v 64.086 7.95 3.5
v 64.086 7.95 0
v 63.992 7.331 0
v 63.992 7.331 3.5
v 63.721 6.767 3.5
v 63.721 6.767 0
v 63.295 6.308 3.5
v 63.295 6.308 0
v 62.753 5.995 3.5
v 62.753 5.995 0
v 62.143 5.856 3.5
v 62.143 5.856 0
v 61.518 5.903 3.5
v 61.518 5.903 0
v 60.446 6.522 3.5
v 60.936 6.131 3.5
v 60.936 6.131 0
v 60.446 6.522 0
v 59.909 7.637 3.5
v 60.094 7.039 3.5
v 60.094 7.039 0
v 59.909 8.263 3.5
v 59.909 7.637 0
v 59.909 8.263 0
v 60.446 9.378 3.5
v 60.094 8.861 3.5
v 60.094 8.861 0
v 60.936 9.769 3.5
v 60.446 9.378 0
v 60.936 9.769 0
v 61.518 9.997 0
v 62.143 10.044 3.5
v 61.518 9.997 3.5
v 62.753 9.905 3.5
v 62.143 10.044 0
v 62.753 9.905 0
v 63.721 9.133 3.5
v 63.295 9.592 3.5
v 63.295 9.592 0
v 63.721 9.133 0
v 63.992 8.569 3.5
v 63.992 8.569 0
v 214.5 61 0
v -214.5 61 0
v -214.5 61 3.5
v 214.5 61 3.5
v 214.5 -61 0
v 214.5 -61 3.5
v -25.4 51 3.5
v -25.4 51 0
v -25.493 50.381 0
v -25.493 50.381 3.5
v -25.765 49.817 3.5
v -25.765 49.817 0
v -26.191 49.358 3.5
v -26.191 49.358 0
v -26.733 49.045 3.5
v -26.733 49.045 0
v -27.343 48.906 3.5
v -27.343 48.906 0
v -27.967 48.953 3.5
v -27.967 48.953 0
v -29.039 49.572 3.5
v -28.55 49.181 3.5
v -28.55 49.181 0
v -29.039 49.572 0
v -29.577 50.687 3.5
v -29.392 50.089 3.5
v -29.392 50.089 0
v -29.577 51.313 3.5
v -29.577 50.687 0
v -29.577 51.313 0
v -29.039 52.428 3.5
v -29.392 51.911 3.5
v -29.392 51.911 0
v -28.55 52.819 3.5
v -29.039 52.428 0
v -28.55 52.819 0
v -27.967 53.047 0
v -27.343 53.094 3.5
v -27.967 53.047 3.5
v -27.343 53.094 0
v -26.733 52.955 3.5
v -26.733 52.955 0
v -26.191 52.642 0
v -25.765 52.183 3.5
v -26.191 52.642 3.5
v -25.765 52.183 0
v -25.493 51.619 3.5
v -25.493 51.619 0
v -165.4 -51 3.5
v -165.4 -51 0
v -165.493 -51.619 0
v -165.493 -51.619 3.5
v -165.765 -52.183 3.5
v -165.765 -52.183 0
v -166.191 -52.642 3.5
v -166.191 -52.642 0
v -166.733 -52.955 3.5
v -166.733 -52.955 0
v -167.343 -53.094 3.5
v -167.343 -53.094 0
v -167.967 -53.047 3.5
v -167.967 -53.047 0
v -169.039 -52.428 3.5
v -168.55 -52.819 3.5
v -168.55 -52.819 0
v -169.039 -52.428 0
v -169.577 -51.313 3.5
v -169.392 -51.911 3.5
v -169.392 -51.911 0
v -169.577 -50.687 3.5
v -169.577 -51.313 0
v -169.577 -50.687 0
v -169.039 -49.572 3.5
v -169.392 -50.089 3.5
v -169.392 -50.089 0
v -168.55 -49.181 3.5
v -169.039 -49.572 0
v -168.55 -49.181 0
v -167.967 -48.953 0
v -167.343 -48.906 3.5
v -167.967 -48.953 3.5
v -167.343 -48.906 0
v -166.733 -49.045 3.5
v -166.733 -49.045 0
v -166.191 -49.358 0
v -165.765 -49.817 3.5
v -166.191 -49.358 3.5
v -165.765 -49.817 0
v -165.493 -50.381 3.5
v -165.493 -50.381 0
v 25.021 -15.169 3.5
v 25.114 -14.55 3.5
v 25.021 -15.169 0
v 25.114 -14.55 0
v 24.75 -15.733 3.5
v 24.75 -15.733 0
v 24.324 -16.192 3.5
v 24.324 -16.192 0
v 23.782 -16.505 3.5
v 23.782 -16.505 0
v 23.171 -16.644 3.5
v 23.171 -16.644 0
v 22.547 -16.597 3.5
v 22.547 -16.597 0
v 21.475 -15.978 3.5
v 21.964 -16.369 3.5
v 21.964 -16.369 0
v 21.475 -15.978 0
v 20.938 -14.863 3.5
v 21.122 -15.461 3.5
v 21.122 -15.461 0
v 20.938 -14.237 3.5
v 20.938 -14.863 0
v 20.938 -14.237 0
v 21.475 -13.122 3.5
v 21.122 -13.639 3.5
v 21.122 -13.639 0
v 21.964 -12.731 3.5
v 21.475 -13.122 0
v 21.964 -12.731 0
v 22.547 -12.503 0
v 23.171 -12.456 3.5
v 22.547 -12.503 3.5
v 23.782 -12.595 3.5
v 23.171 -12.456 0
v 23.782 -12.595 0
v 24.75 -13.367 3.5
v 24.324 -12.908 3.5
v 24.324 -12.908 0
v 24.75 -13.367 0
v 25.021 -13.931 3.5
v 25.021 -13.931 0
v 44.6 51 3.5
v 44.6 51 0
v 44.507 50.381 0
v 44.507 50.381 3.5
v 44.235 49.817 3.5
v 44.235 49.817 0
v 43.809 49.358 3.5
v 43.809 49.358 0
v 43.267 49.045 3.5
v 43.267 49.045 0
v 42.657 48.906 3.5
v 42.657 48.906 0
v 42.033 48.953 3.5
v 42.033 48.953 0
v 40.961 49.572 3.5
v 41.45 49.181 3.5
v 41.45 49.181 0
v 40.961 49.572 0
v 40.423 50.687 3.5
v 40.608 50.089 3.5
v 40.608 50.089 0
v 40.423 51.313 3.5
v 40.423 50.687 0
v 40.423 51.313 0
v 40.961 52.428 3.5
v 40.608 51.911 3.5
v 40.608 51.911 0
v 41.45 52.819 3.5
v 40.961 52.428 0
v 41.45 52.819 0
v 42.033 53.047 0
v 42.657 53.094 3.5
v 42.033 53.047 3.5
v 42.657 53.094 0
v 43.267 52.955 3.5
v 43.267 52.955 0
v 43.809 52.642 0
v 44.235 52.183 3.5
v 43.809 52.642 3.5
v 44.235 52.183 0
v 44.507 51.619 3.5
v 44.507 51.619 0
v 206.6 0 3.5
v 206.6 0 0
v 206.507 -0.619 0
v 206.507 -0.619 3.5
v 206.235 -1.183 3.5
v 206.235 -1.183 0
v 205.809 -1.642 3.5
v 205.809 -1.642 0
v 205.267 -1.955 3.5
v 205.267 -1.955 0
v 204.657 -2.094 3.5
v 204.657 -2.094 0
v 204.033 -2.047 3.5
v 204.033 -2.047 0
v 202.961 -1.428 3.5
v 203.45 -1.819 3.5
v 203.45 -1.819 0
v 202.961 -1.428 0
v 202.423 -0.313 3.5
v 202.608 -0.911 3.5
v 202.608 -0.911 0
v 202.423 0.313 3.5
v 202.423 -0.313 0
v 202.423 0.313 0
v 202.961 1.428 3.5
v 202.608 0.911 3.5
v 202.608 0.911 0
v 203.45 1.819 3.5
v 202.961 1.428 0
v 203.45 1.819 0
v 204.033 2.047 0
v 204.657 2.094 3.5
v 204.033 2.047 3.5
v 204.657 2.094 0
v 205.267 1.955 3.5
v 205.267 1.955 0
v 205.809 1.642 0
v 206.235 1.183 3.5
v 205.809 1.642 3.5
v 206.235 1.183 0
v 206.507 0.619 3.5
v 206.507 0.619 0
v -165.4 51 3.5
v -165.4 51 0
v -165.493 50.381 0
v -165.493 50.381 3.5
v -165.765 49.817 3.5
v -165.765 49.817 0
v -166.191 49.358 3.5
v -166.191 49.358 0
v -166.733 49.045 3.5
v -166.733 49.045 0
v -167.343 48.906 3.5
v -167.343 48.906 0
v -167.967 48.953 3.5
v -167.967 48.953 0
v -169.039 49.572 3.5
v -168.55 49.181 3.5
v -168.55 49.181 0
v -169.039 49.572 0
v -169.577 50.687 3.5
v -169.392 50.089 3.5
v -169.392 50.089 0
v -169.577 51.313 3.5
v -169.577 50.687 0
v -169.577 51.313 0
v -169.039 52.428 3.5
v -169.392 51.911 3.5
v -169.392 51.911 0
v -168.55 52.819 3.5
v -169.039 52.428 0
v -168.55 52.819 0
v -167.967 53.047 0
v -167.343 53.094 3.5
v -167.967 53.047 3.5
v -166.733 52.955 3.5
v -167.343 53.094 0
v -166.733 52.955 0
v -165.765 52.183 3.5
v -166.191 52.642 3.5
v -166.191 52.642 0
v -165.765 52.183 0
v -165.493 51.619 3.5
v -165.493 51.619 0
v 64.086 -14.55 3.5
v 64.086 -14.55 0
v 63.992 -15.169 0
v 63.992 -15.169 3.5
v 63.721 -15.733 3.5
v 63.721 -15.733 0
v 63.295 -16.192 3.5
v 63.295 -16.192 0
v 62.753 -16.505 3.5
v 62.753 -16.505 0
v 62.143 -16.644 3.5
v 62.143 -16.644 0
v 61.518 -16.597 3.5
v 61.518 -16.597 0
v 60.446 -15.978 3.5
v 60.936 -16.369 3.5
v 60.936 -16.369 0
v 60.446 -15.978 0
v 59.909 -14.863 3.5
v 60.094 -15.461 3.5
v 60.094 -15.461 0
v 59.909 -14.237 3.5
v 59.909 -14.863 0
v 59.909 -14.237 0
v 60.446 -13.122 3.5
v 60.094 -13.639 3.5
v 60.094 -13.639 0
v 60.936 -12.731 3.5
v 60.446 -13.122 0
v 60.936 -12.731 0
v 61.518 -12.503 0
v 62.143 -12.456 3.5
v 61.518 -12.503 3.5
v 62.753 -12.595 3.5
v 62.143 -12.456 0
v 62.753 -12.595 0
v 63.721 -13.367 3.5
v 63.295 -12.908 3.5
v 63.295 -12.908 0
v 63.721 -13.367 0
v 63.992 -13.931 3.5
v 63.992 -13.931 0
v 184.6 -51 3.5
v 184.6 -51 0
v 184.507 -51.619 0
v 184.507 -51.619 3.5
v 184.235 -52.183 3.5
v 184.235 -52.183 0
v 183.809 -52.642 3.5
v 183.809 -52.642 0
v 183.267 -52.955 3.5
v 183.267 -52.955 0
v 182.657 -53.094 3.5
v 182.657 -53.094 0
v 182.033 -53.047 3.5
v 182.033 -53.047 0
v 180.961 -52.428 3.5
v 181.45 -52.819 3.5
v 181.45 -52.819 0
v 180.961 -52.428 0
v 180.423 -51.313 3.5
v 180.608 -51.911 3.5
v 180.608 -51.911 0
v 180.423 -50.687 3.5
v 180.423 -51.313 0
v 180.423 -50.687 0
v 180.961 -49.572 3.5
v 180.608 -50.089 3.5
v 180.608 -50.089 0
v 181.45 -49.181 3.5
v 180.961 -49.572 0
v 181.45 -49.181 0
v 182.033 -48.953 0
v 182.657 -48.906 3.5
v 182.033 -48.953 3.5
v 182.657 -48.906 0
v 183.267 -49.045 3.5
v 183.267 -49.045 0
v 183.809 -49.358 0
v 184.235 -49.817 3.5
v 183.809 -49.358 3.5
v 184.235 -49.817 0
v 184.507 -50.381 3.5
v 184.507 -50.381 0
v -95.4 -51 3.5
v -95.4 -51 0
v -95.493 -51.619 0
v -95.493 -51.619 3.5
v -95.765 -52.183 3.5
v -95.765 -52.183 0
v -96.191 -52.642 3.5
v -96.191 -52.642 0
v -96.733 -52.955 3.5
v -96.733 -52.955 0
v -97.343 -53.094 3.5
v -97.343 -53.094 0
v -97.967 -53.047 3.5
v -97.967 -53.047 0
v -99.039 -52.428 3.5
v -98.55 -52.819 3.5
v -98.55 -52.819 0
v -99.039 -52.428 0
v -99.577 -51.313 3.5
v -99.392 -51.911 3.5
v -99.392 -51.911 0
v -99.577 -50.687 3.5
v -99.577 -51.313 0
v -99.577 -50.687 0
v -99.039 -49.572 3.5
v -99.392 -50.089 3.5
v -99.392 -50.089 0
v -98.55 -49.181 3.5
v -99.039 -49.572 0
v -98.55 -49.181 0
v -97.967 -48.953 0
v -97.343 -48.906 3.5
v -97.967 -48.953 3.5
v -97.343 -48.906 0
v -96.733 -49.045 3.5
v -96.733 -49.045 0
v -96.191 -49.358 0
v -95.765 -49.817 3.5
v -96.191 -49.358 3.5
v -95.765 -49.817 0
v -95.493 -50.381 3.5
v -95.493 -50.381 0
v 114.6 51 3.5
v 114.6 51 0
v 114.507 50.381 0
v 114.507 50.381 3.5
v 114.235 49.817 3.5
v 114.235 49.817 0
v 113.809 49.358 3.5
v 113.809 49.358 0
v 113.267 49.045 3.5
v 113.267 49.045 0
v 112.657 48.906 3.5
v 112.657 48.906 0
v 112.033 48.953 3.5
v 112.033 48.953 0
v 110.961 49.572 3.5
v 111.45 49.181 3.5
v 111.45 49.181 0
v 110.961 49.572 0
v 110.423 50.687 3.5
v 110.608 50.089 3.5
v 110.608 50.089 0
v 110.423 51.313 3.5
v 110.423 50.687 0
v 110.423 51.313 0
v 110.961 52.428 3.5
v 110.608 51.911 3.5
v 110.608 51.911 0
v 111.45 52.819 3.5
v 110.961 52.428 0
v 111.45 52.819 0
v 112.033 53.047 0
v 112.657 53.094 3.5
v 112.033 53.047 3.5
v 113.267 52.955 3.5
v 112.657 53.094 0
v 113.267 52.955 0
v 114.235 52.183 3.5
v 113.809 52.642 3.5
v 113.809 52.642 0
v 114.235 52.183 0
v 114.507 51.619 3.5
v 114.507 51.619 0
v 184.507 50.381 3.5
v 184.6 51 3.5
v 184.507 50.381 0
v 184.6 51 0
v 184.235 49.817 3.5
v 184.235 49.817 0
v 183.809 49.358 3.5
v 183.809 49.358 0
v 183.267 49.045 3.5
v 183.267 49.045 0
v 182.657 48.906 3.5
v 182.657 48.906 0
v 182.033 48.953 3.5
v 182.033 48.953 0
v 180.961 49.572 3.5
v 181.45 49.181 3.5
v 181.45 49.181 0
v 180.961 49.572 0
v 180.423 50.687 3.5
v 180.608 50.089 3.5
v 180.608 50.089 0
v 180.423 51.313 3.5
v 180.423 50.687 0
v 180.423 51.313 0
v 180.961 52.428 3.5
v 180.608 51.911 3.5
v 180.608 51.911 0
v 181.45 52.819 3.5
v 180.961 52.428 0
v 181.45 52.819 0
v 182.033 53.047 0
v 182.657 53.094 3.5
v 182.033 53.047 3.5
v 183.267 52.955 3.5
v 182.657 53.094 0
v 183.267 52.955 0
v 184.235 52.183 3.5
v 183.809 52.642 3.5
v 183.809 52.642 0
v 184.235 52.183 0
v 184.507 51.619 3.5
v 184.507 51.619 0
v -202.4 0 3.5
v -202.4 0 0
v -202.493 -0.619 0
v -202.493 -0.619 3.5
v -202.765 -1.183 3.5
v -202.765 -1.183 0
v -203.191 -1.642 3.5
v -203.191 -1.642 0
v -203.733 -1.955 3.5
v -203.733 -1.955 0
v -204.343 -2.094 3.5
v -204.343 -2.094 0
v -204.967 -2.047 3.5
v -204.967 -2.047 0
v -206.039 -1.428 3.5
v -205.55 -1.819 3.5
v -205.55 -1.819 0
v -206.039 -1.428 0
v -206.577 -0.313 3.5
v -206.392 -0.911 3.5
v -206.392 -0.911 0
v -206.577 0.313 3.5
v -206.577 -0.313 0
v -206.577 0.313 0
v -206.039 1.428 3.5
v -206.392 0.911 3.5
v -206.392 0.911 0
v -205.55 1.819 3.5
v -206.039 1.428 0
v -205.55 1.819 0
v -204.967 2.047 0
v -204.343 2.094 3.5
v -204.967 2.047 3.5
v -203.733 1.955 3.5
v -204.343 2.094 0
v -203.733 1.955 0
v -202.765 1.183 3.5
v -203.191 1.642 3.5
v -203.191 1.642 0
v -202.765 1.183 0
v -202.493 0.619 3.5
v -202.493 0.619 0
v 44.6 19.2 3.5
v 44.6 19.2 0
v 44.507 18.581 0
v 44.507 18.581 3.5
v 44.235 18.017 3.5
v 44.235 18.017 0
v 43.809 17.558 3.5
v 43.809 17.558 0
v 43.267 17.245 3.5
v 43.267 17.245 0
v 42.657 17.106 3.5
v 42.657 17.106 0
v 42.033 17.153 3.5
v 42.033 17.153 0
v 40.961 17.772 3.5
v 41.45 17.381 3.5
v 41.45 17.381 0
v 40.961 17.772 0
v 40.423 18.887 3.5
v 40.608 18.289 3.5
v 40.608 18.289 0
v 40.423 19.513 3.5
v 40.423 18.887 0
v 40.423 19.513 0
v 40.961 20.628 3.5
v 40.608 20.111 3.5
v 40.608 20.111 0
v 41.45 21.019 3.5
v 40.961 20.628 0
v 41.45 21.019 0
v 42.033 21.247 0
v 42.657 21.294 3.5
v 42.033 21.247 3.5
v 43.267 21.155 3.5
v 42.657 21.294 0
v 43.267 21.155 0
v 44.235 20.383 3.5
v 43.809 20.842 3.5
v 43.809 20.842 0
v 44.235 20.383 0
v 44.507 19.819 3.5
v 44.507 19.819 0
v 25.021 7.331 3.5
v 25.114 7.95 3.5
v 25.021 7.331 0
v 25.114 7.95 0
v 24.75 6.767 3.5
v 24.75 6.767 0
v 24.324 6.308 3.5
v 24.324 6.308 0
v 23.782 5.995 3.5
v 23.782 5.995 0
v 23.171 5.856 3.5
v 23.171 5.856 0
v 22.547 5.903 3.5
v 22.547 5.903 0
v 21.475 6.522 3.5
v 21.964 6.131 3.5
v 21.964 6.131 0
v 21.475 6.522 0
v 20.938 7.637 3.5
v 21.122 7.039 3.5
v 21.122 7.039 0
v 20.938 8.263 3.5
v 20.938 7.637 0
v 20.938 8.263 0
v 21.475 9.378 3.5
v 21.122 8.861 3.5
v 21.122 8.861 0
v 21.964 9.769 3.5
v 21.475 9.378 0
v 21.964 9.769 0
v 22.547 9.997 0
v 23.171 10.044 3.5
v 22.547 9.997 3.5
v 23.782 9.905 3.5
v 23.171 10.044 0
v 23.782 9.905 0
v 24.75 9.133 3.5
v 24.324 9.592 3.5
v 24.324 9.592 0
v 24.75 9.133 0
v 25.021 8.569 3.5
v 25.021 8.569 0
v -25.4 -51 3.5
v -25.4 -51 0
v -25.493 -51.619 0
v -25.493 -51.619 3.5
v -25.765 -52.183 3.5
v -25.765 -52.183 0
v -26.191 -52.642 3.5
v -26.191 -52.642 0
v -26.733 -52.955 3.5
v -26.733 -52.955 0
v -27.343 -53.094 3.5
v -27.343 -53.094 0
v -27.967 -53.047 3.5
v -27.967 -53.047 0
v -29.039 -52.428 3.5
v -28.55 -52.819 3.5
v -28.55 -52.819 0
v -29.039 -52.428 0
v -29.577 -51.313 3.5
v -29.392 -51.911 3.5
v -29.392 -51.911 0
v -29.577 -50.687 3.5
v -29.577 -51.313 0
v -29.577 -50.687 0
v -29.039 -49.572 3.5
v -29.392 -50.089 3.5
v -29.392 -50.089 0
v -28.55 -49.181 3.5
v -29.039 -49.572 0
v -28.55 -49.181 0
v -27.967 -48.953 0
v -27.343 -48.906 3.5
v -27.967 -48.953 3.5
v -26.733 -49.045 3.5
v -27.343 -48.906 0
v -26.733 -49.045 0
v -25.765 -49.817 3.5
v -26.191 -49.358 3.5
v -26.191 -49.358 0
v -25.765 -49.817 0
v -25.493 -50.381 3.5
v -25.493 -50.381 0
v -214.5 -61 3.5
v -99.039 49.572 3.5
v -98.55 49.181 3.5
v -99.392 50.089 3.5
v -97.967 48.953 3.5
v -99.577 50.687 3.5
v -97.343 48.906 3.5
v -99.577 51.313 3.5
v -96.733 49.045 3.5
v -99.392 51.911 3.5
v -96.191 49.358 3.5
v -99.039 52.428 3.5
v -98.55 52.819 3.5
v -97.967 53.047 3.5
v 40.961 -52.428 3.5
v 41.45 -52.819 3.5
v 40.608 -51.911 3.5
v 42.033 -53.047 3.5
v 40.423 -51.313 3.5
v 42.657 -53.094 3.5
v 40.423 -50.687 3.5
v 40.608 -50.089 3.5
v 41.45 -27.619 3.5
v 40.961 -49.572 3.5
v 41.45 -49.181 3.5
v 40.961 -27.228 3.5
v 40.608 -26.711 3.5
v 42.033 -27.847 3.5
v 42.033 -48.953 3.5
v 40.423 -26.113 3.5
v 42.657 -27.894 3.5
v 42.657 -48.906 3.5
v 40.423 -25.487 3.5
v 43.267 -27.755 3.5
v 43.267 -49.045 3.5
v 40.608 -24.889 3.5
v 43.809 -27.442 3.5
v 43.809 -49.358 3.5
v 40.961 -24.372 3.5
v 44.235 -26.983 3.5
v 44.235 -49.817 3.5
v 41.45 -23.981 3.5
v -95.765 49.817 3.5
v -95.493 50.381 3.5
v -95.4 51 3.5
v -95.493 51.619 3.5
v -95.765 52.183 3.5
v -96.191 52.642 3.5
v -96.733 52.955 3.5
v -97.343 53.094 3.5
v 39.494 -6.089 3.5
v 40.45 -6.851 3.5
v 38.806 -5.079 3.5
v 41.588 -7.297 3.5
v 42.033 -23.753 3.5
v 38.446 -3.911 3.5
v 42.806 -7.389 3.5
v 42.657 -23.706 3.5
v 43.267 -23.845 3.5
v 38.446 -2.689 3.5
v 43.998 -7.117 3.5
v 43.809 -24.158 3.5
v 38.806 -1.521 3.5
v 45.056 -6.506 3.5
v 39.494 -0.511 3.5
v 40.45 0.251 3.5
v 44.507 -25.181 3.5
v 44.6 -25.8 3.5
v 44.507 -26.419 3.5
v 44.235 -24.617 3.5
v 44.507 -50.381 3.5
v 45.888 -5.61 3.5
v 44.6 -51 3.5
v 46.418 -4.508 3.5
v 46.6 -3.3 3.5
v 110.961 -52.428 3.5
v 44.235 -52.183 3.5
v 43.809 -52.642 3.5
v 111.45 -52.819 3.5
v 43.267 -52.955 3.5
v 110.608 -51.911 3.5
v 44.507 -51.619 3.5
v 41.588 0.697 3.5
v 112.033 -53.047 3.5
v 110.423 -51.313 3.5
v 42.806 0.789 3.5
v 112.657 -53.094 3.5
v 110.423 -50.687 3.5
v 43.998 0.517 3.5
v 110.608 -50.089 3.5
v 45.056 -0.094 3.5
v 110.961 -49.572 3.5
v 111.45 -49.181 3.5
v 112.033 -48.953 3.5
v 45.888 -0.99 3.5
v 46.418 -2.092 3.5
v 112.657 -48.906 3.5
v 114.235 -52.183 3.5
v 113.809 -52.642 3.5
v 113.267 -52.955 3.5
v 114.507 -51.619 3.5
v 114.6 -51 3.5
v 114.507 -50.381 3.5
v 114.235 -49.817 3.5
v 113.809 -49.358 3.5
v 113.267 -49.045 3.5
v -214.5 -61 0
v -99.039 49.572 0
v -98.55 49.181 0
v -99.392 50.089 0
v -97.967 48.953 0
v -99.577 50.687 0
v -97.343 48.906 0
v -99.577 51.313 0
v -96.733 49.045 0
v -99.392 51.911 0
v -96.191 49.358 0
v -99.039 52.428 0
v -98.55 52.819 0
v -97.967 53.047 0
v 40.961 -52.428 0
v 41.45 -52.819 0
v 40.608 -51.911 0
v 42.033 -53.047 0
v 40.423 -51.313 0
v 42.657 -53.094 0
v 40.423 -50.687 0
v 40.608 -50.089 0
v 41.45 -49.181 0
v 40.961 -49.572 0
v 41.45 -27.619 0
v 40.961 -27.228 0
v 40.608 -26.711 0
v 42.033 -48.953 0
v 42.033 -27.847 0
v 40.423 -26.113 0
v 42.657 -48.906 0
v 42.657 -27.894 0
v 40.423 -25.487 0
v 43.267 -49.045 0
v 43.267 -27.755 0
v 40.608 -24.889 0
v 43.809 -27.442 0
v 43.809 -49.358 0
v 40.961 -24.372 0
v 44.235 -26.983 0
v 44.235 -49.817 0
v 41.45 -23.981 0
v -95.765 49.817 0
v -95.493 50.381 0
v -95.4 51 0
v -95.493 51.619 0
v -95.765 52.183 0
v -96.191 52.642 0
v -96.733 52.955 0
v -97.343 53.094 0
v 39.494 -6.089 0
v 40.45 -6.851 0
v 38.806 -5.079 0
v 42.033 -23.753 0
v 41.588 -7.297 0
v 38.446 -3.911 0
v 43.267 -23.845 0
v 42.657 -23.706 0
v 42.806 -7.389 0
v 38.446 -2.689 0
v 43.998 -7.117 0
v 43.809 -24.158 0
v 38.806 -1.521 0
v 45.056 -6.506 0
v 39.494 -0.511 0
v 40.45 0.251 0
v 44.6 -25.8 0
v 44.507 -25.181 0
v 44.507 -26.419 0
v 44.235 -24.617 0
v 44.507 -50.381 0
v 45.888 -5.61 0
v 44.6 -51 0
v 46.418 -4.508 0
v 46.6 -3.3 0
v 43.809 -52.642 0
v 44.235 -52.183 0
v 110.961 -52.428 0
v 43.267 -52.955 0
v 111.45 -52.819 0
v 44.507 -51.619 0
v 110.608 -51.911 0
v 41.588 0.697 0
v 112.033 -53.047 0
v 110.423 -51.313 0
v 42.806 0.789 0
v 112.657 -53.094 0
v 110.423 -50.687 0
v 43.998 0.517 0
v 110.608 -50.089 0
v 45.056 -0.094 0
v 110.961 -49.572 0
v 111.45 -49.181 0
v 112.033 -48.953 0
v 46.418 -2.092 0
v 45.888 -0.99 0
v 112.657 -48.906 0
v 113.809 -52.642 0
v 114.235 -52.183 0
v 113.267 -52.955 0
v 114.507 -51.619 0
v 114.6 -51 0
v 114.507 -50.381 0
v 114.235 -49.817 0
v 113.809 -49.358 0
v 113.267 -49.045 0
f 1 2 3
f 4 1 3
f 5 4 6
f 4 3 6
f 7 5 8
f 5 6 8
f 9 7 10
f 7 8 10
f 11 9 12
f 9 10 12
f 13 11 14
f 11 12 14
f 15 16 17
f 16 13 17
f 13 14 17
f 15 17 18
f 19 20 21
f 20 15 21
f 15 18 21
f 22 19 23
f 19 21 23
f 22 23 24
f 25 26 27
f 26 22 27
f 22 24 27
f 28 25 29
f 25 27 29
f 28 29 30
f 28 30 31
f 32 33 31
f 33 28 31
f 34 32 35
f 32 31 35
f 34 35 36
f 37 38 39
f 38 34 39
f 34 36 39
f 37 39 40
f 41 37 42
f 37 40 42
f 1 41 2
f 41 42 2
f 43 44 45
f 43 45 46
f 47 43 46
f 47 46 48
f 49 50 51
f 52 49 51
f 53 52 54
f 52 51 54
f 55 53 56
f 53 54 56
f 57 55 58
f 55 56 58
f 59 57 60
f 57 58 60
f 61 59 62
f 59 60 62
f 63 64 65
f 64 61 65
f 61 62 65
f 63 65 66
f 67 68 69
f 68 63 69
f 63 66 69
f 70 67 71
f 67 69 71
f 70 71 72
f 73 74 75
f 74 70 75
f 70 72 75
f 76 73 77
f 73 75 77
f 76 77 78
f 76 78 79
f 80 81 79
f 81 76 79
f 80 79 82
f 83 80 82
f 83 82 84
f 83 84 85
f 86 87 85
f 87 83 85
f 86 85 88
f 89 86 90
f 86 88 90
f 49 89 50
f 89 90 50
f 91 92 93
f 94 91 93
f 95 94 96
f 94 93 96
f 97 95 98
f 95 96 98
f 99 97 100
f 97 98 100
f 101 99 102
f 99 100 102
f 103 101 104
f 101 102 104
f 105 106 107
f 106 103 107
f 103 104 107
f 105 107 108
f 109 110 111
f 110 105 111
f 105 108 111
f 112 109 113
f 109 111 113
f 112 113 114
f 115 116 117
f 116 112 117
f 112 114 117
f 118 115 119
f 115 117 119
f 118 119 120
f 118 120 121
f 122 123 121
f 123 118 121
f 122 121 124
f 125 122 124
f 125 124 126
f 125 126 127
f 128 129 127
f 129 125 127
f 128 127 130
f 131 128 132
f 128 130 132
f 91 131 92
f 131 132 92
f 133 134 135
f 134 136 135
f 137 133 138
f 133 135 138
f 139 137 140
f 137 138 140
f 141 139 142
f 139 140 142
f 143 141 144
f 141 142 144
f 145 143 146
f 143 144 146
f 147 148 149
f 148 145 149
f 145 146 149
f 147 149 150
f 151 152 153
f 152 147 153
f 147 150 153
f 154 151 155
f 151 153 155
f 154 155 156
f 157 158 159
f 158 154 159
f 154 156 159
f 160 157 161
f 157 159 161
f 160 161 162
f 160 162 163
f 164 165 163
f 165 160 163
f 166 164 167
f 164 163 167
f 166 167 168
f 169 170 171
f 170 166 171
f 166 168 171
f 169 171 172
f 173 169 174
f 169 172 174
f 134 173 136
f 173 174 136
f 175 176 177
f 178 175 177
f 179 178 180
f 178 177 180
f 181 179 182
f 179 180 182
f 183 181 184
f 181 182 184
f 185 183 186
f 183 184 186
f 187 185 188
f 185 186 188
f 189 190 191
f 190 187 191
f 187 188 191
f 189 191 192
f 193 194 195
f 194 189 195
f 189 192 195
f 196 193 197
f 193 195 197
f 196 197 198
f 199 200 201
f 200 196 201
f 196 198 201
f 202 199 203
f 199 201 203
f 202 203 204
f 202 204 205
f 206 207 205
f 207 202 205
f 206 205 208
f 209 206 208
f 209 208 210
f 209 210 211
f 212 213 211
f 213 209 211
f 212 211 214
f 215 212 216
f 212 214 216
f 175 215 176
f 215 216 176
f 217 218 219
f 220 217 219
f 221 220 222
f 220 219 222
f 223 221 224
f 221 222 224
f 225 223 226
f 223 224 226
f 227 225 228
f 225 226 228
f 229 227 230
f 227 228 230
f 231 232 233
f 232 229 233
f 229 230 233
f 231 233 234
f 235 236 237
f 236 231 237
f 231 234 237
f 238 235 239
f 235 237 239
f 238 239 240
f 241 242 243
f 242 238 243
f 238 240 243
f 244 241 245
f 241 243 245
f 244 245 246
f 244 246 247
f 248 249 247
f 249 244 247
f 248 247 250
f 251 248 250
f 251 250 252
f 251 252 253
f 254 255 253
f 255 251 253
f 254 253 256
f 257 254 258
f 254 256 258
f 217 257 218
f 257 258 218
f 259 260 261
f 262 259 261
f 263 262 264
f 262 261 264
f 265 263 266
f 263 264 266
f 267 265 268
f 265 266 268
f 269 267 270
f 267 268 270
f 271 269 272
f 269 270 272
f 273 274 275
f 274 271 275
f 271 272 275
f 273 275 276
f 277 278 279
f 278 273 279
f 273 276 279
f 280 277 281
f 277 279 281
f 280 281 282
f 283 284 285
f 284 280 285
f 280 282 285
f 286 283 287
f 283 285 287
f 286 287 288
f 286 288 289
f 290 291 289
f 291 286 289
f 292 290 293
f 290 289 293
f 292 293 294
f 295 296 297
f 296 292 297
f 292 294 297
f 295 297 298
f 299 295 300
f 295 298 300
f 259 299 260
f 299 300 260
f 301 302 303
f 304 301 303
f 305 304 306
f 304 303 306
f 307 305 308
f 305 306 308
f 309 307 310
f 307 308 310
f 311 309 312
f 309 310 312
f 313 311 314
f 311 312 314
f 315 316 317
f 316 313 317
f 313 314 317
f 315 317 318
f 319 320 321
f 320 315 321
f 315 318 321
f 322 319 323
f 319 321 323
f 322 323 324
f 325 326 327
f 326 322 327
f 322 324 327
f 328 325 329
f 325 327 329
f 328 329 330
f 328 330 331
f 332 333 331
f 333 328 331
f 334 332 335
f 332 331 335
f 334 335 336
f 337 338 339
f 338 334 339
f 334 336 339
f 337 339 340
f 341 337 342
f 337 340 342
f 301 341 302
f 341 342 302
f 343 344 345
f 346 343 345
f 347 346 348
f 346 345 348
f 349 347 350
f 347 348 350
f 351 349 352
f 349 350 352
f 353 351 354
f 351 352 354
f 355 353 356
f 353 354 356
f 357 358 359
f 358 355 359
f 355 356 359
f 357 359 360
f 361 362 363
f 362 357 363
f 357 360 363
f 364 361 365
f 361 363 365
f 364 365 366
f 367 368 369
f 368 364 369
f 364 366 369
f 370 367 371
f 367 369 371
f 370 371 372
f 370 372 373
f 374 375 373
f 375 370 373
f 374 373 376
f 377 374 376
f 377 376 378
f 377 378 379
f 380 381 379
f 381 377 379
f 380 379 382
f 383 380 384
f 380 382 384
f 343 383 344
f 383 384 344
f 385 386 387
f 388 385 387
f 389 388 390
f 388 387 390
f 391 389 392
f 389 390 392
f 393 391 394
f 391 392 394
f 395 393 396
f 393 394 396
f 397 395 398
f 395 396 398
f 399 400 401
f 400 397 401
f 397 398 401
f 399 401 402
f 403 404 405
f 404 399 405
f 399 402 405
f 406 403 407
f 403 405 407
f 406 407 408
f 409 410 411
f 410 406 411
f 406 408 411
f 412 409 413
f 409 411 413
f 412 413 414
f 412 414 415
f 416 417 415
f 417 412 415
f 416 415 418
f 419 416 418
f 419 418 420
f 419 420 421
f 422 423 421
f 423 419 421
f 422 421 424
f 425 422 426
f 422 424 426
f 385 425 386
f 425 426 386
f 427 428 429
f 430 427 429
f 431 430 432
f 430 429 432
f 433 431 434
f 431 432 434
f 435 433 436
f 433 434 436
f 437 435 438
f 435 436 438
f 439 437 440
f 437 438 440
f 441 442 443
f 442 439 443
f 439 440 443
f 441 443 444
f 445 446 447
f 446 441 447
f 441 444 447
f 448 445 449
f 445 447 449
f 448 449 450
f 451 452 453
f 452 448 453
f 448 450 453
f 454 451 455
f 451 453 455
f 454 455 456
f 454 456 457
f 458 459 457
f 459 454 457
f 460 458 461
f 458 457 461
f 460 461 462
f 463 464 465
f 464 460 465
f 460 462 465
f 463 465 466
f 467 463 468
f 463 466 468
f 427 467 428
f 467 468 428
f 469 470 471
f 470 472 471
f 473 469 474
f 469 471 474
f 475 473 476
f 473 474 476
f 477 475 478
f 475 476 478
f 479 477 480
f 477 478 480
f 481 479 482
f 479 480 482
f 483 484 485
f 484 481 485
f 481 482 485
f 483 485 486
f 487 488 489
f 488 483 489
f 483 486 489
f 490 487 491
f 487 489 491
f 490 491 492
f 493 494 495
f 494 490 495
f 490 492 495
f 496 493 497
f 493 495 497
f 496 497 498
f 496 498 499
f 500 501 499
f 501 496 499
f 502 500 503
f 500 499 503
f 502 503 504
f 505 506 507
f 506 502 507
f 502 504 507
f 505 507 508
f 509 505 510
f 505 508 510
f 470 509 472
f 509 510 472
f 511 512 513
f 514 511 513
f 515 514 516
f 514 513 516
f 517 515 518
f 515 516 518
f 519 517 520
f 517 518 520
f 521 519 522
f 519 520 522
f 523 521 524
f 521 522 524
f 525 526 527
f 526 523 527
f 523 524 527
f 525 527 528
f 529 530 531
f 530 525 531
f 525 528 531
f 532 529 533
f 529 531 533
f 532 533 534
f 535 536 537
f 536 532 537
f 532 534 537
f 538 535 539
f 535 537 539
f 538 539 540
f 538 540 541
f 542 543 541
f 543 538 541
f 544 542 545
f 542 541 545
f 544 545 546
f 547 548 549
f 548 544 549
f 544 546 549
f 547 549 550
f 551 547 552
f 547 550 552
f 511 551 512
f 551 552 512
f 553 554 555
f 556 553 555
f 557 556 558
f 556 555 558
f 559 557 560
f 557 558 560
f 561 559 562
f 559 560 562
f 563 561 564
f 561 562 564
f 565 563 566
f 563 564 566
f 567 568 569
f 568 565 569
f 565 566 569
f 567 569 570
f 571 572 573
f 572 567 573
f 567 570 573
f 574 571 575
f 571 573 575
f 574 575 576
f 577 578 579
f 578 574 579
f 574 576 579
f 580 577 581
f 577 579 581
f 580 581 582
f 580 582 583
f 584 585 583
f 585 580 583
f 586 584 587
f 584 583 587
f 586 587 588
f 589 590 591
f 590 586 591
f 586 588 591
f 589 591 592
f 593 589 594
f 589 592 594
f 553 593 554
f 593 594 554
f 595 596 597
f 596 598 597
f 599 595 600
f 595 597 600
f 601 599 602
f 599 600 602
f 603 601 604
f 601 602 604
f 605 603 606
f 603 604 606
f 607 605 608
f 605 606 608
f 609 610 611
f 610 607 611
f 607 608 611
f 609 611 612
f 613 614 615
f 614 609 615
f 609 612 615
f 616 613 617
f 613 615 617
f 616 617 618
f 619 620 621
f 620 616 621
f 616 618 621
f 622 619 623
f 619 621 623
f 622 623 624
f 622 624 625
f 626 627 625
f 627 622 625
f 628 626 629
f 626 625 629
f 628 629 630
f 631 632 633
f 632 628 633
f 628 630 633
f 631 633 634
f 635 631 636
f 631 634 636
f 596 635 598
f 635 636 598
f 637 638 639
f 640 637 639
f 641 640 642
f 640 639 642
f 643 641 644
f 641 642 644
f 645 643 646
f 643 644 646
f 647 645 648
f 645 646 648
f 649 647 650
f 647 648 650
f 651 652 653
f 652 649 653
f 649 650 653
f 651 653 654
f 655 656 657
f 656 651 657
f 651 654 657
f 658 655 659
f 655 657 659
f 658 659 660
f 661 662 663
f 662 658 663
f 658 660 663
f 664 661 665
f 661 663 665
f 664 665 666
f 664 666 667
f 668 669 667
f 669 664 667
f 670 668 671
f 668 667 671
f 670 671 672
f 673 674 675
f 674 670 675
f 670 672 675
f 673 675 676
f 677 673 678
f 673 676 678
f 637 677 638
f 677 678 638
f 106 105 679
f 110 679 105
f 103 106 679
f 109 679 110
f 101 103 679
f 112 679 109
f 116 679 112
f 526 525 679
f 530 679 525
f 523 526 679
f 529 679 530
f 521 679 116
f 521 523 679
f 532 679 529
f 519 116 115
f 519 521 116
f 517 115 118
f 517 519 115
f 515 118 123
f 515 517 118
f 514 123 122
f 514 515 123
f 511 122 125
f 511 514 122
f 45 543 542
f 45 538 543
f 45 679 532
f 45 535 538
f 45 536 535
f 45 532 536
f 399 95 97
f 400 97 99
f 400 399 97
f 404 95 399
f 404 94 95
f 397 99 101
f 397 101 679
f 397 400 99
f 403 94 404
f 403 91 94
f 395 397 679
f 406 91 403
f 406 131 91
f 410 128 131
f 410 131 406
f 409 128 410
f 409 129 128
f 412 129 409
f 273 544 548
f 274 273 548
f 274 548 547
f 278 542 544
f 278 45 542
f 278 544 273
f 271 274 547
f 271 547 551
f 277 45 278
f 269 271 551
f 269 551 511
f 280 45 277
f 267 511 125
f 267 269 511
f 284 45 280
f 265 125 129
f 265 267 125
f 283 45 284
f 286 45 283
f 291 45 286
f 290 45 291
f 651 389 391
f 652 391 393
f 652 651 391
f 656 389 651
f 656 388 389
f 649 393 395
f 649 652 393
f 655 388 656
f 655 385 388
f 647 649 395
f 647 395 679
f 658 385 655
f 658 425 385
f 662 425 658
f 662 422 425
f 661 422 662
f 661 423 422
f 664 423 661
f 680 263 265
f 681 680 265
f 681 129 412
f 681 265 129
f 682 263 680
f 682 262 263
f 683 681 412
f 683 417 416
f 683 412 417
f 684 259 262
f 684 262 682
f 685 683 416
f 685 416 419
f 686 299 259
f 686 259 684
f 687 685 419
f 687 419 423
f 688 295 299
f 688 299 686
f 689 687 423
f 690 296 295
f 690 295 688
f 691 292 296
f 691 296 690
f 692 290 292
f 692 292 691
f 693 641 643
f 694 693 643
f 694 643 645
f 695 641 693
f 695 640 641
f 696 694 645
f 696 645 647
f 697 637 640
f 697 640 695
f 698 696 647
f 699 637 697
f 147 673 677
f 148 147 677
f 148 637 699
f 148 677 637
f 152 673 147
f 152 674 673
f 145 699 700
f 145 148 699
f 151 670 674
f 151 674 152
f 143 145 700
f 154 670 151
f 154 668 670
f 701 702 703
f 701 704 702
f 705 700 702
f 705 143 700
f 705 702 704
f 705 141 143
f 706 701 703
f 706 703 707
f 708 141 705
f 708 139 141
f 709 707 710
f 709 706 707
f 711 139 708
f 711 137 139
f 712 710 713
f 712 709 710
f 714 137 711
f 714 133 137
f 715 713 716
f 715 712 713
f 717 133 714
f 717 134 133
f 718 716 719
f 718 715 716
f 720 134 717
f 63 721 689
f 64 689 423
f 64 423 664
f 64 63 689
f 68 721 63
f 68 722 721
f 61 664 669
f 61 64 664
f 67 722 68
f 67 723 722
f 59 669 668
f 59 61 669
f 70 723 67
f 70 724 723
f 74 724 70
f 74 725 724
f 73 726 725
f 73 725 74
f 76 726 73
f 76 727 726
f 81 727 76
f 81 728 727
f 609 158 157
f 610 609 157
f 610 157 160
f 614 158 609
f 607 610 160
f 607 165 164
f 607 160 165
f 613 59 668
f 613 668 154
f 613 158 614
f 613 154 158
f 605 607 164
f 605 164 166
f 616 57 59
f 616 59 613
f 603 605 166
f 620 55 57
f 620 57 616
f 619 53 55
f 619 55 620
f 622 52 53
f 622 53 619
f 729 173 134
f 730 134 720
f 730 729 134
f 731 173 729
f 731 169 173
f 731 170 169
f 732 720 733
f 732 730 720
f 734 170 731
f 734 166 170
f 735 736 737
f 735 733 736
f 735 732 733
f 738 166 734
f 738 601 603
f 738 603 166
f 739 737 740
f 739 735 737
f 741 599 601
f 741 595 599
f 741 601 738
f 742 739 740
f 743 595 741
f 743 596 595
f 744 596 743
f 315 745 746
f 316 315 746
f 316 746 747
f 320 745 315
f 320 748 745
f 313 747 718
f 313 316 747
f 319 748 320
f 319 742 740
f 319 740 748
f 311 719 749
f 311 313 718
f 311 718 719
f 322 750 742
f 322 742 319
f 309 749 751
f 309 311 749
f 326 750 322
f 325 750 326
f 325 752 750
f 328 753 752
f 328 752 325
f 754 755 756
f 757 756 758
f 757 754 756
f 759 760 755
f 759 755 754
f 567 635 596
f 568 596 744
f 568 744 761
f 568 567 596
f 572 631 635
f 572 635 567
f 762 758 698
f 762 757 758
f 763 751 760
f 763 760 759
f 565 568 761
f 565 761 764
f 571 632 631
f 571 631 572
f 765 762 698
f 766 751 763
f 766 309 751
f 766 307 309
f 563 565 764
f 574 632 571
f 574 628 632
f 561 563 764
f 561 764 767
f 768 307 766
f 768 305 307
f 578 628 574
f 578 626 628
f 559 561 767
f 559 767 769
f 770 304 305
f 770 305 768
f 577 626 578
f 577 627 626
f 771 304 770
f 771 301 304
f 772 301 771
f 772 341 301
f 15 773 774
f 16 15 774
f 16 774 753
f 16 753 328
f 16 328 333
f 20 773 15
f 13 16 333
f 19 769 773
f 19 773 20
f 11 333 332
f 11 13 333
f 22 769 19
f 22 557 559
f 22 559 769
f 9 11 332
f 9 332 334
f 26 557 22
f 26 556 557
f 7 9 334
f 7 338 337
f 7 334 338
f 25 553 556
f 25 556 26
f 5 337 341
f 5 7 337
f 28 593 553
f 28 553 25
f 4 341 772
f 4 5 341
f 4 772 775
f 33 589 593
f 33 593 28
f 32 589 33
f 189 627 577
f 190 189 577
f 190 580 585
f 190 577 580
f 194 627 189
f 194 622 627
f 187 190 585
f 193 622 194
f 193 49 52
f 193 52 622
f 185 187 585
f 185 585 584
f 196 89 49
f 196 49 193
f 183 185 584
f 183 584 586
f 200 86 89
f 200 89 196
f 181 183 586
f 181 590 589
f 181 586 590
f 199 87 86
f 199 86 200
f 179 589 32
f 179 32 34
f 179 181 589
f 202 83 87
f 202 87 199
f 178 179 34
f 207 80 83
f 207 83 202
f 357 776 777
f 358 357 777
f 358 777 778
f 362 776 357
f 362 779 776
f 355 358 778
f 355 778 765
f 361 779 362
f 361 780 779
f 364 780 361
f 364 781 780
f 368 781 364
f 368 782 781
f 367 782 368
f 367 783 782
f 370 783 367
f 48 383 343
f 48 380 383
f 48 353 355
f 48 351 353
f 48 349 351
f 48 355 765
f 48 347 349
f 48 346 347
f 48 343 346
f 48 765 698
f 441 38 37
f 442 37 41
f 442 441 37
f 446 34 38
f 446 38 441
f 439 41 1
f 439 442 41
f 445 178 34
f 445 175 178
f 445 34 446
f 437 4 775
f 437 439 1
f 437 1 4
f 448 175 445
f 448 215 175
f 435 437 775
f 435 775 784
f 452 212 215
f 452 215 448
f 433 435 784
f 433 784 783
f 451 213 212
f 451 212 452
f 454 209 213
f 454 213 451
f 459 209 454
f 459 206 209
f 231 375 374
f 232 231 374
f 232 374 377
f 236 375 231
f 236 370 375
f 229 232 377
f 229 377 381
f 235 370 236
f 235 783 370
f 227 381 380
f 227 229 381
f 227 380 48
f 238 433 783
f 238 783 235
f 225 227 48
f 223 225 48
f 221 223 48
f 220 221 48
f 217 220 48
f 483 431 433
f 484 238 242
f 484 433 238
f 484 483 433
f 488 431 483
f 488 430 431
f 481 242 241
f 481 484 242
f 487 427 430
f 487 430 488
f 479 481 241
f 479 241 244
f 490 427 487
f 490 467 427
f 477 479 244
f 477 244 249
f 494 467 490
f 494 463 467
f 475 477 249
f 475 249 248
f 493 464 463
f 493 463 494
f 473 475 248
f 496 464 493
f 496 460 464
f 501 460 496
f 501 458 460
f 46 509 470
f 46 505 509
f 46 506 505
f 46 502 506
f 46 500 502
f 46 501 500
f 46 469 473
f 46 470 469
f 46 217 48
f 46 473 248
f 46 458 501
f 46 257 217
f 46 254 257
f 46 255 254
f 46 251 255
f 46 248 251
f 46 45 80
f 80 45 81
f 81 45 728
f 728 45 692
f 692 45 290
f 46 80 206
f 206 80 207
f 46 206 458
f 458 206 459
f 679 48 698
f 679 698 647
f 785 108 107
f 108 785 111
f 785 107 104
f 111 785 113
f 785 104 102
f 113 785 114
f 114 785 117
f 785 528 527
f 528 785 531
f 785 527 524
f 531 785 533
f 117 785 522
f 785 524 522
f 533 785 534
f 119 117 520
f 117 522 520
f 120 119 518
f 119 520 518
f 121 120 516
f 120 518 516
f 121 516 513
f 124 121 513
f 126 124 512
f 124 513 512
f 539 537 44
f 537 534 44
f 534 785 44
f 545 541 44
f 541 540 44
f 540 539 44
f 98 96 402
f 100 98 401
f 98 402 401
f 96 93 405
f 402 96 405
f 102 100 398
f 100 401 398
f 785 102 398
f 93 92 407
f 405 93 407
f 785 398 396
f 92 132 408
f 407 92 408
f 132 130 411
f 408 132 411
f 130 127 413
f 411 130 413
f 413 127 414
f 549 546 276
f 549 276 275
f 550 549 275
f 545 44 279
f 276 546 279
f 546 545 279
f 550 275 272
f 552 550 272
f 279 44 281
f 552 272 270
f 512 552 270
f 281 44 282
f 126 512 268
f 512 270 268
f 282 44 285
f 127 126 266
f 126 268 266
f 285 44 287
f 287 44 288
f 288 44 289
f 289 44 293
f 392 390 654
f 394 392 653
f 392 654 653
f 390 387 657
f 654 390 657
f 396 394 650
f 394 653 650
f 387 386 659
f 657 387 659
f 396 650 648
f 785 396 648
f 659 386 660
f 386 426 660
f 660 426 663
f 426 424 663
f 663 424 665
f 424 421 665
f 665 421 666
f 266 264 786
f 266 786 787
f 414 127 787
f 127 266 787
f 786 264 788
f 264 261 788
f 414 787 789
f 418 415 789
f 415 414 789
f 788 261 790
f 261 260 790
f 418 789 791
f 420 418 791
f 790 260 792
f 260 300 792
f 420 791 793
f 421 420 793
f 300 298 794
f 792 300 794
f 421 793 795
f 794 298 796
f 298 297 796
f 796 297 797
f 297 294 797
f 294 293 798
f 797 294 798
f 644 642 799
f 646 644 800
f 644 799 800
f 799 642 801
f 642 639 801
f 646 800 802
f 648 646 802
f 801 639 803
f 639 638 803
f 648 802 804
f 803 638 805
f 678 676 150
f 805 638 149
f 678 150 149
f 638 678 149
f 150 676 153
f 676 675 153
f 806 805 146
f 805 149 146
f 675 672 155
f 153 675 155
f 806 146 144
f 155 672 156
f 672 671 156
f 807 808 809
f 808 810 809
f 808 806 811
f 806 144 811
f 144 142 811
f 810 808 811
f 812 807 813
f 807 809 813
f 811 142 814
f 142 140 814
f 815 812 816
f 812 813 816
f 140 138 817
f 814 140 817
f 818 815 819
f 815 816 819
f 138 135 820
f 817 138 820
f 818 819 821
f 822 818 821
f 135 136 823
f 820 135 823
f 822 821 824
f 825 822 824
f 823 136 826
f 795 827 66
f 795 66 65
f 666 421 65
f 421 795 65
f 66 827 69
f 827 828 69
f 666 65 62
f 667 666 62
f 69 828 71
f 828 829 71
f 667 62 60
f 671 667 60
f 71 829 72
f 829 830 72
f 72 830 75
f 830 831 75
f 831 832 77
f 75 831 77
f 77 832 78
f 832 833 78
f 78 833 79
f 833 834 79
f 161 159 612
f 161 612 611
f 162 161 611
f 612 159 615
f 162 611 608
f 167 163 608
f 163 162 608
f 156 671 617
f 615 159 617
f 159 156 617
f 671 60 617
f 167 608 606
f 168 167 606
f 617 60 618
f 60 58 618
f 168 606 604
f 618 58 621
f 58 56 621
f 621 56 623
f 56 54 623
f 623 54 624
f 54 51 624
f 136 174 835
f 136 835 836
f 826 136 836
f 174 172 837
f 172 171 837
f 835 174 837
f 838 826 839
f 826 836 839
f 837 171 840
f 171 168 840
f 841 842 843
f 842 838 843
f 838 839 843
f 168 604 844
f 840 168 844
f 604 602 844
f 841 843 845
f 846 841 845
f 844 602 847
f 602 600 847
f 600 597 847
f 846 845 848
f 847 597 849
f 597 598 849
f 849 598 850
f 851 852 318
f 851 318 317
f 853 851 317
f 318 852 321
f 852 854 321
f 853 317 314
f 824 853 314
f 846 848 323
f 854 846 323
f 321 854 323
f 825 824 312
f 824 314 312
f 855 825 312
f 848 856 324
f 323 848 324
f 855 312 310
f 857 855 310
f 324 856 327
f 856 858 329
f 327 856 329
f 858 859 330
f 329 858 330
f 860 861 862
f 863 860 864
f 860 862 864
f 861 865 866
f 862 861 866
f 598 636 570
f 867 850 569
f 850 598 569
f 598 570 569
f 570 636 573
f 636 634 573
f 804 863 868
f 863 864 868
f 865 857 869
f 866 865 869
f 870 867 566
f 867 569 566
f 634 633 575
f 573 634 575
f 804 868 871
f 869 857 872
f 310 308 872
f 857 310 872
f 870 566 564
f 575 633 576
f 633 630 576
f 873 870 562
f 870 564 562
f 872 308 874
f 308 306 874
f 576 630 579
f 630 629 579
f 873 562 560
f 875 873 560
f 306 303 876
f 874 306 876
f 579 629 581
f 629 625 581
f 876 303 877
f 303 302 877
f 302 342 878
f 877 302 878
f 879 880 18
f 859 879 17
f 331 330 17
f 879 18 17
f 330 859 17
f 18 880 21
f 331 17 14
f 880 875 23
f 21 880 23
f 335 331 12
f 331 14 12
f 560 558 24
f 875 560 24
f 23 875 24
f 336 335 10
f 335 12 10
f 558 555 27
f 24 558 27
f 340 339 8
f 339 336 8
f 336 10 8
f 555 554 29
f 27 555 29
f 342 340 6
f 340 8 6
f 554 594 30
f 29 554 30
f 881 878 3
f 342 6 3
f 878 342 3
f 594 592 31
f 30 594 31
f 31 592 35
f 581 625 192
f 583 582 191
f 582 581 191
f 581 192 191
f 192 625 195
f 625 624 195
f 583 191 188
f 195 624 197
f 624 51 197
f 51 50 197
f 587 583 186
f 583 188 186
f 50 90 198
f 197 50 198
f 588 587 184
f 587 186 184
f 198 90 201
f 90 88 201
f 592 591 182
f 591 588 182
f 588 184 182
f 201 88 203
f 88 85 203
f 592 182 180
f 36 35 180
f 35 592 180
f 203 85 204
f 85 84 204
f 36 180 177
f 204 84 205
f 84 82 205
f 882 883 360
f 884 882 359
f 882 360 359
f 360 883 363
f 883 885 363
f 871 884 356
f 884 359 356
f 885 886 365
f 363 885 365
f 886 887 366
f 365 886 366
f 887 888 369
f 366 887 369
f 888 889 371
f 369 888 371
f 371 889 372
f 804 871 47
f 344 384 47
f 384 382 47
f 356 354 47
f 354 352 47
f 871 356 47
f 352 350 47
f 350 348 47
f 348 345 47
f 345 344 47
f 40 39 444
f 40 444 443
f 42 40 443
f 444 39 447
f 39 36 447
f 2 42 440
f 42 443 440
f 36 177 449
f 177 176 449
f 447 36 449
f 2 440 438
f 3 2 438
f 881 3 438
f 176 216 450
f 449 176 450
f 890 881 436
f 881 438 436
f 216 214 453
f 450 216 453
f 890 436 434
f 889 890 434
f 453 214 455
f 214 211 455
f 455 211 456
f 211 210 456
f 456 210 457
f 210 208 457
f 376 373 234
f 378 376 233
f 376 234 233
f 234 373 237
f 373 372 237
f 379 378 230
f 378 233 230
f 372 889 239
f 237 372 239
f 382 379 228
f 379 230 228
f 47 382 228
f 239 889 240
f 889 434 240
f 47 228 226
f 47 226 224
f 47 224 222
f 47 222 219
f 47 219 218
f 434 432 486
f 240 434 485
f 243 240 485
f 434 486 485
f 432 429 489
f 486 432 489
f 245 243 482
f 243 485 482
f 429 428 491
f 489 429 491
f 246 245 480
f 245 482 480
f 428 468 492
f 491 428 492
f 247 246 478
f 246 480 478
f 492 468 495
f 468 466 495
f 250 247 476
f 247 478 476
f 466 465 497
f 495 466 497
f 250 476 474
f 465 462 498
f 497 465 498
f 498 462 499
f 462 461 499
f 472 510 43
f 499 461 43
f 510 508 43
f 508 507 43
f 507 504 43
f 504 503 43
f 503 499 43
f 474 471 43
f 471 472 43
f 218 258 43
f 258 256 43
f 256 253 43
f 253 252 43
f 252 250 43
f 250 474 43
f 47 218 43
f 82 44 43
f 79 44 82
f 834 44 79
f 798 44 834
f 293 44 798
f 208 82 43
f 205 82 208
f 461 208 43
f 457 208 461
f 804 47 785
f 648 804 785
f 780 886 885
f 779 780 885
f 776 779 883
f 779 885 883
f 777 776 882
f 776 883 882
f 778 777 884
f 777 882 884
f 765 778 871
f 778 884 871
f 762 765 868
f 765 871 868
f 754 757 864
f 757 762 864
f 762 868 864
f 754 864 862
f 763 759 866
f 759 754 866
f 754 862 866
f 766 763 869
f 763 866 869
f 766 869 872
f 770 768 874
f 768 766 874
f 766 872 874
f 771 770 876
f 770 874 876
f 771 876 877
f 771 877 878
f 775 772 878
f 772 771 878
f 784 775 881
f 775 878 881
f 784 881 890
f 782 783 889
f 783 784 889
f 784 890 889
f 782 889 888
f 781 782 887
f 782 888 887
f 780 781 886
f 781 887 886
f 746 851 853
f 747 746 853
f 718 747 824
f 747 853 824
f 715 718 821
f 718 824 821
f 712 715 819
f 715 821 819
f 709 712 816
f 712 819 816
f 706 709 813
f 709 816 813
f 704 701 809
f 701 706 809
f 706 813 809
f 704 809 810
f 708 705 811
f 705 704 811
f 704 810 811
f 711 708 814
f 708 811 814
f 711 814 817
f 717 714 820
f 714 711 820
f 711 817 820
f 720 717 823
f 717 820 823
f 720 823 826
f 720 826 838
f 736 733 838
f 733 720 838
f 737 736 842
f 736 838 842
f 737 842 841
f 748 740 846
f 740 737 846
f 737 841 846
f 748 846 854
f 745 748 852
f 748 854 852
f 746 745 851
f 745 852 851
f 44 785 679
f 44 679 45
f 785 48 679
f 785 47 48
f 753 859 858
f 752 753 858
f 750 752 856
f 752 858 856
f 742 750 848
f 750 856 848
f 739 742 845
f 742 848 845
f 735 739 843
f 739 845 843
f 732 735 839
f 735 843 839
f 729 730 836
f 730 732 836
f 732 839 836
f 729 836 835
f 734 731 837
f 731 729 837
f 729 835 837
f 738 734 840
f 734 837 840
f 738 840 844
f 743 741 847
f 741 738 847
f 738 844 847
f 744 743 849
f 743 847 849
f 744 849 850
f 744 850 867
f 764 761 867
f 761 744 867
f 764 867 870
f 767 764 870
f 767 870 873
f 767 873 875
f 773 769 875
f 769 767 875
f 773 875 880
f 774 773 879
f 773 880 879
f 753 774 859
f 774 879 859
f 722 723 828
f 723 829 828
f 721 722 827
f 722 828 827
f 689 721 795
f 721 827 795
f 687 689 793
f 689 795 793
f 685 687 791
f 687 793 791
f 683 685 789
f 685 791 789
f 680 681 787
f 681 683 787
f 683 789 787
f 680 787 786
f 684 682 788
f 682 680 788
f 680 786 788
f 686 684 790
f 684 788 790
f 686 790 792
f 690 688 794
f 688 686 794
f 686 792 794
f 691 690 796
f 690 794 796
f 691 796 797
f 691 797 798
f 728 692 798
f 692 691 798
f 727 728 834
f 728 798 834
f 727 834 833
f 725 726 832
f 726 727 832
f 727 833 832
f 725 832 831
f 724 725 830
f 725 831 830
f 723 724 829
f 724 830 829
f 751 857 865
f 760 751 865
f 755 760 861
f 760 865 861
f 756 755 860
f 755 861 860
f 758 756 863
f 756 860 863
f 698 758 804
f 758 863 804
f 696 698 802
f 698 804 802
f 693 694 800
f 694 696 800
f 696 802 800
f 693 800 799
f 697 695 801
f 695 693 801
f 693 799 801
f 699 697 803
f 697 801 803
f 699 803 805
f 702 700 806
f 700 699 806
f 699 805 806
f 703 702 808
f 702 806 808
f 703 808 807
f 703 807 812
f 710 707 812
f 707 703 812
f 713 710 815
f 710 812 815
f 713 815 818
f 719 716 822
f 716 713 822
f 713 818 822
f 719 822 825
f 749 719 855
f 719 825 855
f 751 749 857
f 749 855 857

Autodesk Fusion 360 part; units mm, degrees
sketch "Sketch2" plane through (0, 0, 0) normal (0, 0, 1) x (1, 0, 0)
  line L0 (-214.5, -61) -> (-214.5, 61)
  line L1 (-214.5, -61) -> (214.5, 61) construction
  line L2 (-214.5, 61) -> (214.5, 61)
  circle A0 centre (42.5, -3.3) radius 4.1
  line L3 (214.5, -61) -> (-214.5, 61) construction
  line L4 (214.5, 61) -> (214.5, -61)
  line L5 (214.5, -61) -> (-214.5, -61)
  line L6 (-214.5, 0) -> (214.5, 0) construction
  line L7 (-214.5, -3.3) -> (214.5, -3.3) construction
  line L8 (42.5, 61) -> (42.5, -61) construction
  circle A1 centre (42.5, 51) radius 2.1
  line L9 (-214.5, 51) -> (214.5, 51) construction
  circle A2 centre (42.5, -3.3) radius 22.5 construction
  circle A3 centre (42.5, 19.2) radius 2.1
  circle A4 centre (23.0144, 7.95) radius 2.1
  circle A5 centre (23.0144, -14.55) radius 2.1
  circle A6 centre (42.5, -25.8) radius 2.1
  circle A7 centre (61.9856, -14.55) radius 2.1
  circle A8 centre (61.9856, 7.95) radius 2.1
  line L10 (-194.5, 61) -> (-194.5, -61) construction
  line L11 (194.5, 61) -> (194.5, -61) construction
  circle A9 centre (-167.5, 51) radius 2.1
  circle A10 centre (-97.5, 51) radius 2.1
  circle A11 centre (-27.5, 51) radius 2.1
  circle A12 centre (112.5, 51) radius 2.1
  circle A13 centre (182.5, 51) radius 2.1
  circle A14 centre (112.5, -51) radius 2.1
  line L12 (-214.5, -51) -> (214.5, -51) construction
  circle A15 centre (-27.5, -51) radius 2.1
  circle A16 centre (-167.5, -51) radius 2.1
  circle A17 centre (182.5, -51) radius 2.1
  circle A18 centre (-97.5, -51) radius 2.1
  circle A19 centre (42.5, -51) radius 2.1
  circle A20 centre (-204.5, 0) radius 2.1
  circle A21 centre (204.5, 0) radius 2.1
  dimension "d11" = 122
  dimension "d12" = 429
  dimension "d14" = 8.2
  dimension "d18" = 3.3
  dimension "d20" = 172
  dimension "d21" = 4.2
  dimension "d23" = 10
  dimension "d24" = 45
  dimension "d25" = 4.2
  dimension "d27" = 360
  dimension "d30" = 70
  dimension "d31" = 0
  dimension "d32" = 20
  dimension "d33" = 20
  dimension "d34" = 4.2
  dimension "d35" = 10
  dimension "d36" = 4.2
  dimension "d37" = 10
extrude "Extrude2" add sketch "Sketch2" along normal blind 3.5
sketch "Sketch3" plane through (0, 0, 3.5) normal (0, 0, 1) x (-1, 0, 0)
  circle A0 centre (-42.5, 3.3) radius 4
  line L0 (-214.5, 61) -> (-214.5, -61)
  line L1 (-214.5, -61) -> (214.5, -61)
  line L2 (214.5, -61) -> (214.5, 61)
  line L3 (214.5, 61) -> (-214.5, 61)
  line L4 (-130, -50) -> (-141.5967, -50) construction
  line L5 (-141.5967, -50) -> (-141.5967, -60) construction
  line L6 (-141.5967, -60) -> (-130, -60) construction
  line L7 (-130, -60) -> (-130, -50) construction
  circle A1 centre (-182.5, 51) radius 2.1
  circle A2 centre (97.5, 51) radius 2.1
  circle A3 centre (-42.5, 51) radius 2.1
  circle A4 centre (204.5, 0) radius 2.1
  circle A5 centre (-204.5, 0) radius 2.1
  circle A6 centre (167.5, 51) radius 2.1
  circle A7 centre (97.5, -51) radius 2.1
  circle A8 centre (27.5, -51) radius 2.1
  circle A9 centre (-112.5, -51) radius 2.1
  circle A10 centre (-182.5, -51) radius 2.1
  circle A11 centre (-112.5, 51) radius 2.1
  circle A12 centre (27.5, 51) radius 2.1
  circle A13 centre (167.5, -51) radius 2.1
  circle A14 centre (-61.9856, -7.95) radius 2.1
  circle A15 centre (-61.9856, 14.55) radius 2.1
  circle A16 centre (-42.5, 25.8) radius 2.1
  circle A17 centre (-23.0144, 14.55) radius 2.1
  circle A18 centre (-23.0144, -7.95) radius 2.1
  circle A19 centre (-42.5, -19.2) radius 2.1
  circle A20 centre (-42.5, -51) radius 2.1
  circle A21 centre (-42.5, 3.3) radius 4.1
  line L8 (-214.5, 61) -> (-214.5, -61)
  line L9 (-214.5, -61) -> (214.5, -61)
  line L10 (214.5, -61) -> (214.5, 61)
  line L11 (214.5, 61) -> (-214.5, 61)
